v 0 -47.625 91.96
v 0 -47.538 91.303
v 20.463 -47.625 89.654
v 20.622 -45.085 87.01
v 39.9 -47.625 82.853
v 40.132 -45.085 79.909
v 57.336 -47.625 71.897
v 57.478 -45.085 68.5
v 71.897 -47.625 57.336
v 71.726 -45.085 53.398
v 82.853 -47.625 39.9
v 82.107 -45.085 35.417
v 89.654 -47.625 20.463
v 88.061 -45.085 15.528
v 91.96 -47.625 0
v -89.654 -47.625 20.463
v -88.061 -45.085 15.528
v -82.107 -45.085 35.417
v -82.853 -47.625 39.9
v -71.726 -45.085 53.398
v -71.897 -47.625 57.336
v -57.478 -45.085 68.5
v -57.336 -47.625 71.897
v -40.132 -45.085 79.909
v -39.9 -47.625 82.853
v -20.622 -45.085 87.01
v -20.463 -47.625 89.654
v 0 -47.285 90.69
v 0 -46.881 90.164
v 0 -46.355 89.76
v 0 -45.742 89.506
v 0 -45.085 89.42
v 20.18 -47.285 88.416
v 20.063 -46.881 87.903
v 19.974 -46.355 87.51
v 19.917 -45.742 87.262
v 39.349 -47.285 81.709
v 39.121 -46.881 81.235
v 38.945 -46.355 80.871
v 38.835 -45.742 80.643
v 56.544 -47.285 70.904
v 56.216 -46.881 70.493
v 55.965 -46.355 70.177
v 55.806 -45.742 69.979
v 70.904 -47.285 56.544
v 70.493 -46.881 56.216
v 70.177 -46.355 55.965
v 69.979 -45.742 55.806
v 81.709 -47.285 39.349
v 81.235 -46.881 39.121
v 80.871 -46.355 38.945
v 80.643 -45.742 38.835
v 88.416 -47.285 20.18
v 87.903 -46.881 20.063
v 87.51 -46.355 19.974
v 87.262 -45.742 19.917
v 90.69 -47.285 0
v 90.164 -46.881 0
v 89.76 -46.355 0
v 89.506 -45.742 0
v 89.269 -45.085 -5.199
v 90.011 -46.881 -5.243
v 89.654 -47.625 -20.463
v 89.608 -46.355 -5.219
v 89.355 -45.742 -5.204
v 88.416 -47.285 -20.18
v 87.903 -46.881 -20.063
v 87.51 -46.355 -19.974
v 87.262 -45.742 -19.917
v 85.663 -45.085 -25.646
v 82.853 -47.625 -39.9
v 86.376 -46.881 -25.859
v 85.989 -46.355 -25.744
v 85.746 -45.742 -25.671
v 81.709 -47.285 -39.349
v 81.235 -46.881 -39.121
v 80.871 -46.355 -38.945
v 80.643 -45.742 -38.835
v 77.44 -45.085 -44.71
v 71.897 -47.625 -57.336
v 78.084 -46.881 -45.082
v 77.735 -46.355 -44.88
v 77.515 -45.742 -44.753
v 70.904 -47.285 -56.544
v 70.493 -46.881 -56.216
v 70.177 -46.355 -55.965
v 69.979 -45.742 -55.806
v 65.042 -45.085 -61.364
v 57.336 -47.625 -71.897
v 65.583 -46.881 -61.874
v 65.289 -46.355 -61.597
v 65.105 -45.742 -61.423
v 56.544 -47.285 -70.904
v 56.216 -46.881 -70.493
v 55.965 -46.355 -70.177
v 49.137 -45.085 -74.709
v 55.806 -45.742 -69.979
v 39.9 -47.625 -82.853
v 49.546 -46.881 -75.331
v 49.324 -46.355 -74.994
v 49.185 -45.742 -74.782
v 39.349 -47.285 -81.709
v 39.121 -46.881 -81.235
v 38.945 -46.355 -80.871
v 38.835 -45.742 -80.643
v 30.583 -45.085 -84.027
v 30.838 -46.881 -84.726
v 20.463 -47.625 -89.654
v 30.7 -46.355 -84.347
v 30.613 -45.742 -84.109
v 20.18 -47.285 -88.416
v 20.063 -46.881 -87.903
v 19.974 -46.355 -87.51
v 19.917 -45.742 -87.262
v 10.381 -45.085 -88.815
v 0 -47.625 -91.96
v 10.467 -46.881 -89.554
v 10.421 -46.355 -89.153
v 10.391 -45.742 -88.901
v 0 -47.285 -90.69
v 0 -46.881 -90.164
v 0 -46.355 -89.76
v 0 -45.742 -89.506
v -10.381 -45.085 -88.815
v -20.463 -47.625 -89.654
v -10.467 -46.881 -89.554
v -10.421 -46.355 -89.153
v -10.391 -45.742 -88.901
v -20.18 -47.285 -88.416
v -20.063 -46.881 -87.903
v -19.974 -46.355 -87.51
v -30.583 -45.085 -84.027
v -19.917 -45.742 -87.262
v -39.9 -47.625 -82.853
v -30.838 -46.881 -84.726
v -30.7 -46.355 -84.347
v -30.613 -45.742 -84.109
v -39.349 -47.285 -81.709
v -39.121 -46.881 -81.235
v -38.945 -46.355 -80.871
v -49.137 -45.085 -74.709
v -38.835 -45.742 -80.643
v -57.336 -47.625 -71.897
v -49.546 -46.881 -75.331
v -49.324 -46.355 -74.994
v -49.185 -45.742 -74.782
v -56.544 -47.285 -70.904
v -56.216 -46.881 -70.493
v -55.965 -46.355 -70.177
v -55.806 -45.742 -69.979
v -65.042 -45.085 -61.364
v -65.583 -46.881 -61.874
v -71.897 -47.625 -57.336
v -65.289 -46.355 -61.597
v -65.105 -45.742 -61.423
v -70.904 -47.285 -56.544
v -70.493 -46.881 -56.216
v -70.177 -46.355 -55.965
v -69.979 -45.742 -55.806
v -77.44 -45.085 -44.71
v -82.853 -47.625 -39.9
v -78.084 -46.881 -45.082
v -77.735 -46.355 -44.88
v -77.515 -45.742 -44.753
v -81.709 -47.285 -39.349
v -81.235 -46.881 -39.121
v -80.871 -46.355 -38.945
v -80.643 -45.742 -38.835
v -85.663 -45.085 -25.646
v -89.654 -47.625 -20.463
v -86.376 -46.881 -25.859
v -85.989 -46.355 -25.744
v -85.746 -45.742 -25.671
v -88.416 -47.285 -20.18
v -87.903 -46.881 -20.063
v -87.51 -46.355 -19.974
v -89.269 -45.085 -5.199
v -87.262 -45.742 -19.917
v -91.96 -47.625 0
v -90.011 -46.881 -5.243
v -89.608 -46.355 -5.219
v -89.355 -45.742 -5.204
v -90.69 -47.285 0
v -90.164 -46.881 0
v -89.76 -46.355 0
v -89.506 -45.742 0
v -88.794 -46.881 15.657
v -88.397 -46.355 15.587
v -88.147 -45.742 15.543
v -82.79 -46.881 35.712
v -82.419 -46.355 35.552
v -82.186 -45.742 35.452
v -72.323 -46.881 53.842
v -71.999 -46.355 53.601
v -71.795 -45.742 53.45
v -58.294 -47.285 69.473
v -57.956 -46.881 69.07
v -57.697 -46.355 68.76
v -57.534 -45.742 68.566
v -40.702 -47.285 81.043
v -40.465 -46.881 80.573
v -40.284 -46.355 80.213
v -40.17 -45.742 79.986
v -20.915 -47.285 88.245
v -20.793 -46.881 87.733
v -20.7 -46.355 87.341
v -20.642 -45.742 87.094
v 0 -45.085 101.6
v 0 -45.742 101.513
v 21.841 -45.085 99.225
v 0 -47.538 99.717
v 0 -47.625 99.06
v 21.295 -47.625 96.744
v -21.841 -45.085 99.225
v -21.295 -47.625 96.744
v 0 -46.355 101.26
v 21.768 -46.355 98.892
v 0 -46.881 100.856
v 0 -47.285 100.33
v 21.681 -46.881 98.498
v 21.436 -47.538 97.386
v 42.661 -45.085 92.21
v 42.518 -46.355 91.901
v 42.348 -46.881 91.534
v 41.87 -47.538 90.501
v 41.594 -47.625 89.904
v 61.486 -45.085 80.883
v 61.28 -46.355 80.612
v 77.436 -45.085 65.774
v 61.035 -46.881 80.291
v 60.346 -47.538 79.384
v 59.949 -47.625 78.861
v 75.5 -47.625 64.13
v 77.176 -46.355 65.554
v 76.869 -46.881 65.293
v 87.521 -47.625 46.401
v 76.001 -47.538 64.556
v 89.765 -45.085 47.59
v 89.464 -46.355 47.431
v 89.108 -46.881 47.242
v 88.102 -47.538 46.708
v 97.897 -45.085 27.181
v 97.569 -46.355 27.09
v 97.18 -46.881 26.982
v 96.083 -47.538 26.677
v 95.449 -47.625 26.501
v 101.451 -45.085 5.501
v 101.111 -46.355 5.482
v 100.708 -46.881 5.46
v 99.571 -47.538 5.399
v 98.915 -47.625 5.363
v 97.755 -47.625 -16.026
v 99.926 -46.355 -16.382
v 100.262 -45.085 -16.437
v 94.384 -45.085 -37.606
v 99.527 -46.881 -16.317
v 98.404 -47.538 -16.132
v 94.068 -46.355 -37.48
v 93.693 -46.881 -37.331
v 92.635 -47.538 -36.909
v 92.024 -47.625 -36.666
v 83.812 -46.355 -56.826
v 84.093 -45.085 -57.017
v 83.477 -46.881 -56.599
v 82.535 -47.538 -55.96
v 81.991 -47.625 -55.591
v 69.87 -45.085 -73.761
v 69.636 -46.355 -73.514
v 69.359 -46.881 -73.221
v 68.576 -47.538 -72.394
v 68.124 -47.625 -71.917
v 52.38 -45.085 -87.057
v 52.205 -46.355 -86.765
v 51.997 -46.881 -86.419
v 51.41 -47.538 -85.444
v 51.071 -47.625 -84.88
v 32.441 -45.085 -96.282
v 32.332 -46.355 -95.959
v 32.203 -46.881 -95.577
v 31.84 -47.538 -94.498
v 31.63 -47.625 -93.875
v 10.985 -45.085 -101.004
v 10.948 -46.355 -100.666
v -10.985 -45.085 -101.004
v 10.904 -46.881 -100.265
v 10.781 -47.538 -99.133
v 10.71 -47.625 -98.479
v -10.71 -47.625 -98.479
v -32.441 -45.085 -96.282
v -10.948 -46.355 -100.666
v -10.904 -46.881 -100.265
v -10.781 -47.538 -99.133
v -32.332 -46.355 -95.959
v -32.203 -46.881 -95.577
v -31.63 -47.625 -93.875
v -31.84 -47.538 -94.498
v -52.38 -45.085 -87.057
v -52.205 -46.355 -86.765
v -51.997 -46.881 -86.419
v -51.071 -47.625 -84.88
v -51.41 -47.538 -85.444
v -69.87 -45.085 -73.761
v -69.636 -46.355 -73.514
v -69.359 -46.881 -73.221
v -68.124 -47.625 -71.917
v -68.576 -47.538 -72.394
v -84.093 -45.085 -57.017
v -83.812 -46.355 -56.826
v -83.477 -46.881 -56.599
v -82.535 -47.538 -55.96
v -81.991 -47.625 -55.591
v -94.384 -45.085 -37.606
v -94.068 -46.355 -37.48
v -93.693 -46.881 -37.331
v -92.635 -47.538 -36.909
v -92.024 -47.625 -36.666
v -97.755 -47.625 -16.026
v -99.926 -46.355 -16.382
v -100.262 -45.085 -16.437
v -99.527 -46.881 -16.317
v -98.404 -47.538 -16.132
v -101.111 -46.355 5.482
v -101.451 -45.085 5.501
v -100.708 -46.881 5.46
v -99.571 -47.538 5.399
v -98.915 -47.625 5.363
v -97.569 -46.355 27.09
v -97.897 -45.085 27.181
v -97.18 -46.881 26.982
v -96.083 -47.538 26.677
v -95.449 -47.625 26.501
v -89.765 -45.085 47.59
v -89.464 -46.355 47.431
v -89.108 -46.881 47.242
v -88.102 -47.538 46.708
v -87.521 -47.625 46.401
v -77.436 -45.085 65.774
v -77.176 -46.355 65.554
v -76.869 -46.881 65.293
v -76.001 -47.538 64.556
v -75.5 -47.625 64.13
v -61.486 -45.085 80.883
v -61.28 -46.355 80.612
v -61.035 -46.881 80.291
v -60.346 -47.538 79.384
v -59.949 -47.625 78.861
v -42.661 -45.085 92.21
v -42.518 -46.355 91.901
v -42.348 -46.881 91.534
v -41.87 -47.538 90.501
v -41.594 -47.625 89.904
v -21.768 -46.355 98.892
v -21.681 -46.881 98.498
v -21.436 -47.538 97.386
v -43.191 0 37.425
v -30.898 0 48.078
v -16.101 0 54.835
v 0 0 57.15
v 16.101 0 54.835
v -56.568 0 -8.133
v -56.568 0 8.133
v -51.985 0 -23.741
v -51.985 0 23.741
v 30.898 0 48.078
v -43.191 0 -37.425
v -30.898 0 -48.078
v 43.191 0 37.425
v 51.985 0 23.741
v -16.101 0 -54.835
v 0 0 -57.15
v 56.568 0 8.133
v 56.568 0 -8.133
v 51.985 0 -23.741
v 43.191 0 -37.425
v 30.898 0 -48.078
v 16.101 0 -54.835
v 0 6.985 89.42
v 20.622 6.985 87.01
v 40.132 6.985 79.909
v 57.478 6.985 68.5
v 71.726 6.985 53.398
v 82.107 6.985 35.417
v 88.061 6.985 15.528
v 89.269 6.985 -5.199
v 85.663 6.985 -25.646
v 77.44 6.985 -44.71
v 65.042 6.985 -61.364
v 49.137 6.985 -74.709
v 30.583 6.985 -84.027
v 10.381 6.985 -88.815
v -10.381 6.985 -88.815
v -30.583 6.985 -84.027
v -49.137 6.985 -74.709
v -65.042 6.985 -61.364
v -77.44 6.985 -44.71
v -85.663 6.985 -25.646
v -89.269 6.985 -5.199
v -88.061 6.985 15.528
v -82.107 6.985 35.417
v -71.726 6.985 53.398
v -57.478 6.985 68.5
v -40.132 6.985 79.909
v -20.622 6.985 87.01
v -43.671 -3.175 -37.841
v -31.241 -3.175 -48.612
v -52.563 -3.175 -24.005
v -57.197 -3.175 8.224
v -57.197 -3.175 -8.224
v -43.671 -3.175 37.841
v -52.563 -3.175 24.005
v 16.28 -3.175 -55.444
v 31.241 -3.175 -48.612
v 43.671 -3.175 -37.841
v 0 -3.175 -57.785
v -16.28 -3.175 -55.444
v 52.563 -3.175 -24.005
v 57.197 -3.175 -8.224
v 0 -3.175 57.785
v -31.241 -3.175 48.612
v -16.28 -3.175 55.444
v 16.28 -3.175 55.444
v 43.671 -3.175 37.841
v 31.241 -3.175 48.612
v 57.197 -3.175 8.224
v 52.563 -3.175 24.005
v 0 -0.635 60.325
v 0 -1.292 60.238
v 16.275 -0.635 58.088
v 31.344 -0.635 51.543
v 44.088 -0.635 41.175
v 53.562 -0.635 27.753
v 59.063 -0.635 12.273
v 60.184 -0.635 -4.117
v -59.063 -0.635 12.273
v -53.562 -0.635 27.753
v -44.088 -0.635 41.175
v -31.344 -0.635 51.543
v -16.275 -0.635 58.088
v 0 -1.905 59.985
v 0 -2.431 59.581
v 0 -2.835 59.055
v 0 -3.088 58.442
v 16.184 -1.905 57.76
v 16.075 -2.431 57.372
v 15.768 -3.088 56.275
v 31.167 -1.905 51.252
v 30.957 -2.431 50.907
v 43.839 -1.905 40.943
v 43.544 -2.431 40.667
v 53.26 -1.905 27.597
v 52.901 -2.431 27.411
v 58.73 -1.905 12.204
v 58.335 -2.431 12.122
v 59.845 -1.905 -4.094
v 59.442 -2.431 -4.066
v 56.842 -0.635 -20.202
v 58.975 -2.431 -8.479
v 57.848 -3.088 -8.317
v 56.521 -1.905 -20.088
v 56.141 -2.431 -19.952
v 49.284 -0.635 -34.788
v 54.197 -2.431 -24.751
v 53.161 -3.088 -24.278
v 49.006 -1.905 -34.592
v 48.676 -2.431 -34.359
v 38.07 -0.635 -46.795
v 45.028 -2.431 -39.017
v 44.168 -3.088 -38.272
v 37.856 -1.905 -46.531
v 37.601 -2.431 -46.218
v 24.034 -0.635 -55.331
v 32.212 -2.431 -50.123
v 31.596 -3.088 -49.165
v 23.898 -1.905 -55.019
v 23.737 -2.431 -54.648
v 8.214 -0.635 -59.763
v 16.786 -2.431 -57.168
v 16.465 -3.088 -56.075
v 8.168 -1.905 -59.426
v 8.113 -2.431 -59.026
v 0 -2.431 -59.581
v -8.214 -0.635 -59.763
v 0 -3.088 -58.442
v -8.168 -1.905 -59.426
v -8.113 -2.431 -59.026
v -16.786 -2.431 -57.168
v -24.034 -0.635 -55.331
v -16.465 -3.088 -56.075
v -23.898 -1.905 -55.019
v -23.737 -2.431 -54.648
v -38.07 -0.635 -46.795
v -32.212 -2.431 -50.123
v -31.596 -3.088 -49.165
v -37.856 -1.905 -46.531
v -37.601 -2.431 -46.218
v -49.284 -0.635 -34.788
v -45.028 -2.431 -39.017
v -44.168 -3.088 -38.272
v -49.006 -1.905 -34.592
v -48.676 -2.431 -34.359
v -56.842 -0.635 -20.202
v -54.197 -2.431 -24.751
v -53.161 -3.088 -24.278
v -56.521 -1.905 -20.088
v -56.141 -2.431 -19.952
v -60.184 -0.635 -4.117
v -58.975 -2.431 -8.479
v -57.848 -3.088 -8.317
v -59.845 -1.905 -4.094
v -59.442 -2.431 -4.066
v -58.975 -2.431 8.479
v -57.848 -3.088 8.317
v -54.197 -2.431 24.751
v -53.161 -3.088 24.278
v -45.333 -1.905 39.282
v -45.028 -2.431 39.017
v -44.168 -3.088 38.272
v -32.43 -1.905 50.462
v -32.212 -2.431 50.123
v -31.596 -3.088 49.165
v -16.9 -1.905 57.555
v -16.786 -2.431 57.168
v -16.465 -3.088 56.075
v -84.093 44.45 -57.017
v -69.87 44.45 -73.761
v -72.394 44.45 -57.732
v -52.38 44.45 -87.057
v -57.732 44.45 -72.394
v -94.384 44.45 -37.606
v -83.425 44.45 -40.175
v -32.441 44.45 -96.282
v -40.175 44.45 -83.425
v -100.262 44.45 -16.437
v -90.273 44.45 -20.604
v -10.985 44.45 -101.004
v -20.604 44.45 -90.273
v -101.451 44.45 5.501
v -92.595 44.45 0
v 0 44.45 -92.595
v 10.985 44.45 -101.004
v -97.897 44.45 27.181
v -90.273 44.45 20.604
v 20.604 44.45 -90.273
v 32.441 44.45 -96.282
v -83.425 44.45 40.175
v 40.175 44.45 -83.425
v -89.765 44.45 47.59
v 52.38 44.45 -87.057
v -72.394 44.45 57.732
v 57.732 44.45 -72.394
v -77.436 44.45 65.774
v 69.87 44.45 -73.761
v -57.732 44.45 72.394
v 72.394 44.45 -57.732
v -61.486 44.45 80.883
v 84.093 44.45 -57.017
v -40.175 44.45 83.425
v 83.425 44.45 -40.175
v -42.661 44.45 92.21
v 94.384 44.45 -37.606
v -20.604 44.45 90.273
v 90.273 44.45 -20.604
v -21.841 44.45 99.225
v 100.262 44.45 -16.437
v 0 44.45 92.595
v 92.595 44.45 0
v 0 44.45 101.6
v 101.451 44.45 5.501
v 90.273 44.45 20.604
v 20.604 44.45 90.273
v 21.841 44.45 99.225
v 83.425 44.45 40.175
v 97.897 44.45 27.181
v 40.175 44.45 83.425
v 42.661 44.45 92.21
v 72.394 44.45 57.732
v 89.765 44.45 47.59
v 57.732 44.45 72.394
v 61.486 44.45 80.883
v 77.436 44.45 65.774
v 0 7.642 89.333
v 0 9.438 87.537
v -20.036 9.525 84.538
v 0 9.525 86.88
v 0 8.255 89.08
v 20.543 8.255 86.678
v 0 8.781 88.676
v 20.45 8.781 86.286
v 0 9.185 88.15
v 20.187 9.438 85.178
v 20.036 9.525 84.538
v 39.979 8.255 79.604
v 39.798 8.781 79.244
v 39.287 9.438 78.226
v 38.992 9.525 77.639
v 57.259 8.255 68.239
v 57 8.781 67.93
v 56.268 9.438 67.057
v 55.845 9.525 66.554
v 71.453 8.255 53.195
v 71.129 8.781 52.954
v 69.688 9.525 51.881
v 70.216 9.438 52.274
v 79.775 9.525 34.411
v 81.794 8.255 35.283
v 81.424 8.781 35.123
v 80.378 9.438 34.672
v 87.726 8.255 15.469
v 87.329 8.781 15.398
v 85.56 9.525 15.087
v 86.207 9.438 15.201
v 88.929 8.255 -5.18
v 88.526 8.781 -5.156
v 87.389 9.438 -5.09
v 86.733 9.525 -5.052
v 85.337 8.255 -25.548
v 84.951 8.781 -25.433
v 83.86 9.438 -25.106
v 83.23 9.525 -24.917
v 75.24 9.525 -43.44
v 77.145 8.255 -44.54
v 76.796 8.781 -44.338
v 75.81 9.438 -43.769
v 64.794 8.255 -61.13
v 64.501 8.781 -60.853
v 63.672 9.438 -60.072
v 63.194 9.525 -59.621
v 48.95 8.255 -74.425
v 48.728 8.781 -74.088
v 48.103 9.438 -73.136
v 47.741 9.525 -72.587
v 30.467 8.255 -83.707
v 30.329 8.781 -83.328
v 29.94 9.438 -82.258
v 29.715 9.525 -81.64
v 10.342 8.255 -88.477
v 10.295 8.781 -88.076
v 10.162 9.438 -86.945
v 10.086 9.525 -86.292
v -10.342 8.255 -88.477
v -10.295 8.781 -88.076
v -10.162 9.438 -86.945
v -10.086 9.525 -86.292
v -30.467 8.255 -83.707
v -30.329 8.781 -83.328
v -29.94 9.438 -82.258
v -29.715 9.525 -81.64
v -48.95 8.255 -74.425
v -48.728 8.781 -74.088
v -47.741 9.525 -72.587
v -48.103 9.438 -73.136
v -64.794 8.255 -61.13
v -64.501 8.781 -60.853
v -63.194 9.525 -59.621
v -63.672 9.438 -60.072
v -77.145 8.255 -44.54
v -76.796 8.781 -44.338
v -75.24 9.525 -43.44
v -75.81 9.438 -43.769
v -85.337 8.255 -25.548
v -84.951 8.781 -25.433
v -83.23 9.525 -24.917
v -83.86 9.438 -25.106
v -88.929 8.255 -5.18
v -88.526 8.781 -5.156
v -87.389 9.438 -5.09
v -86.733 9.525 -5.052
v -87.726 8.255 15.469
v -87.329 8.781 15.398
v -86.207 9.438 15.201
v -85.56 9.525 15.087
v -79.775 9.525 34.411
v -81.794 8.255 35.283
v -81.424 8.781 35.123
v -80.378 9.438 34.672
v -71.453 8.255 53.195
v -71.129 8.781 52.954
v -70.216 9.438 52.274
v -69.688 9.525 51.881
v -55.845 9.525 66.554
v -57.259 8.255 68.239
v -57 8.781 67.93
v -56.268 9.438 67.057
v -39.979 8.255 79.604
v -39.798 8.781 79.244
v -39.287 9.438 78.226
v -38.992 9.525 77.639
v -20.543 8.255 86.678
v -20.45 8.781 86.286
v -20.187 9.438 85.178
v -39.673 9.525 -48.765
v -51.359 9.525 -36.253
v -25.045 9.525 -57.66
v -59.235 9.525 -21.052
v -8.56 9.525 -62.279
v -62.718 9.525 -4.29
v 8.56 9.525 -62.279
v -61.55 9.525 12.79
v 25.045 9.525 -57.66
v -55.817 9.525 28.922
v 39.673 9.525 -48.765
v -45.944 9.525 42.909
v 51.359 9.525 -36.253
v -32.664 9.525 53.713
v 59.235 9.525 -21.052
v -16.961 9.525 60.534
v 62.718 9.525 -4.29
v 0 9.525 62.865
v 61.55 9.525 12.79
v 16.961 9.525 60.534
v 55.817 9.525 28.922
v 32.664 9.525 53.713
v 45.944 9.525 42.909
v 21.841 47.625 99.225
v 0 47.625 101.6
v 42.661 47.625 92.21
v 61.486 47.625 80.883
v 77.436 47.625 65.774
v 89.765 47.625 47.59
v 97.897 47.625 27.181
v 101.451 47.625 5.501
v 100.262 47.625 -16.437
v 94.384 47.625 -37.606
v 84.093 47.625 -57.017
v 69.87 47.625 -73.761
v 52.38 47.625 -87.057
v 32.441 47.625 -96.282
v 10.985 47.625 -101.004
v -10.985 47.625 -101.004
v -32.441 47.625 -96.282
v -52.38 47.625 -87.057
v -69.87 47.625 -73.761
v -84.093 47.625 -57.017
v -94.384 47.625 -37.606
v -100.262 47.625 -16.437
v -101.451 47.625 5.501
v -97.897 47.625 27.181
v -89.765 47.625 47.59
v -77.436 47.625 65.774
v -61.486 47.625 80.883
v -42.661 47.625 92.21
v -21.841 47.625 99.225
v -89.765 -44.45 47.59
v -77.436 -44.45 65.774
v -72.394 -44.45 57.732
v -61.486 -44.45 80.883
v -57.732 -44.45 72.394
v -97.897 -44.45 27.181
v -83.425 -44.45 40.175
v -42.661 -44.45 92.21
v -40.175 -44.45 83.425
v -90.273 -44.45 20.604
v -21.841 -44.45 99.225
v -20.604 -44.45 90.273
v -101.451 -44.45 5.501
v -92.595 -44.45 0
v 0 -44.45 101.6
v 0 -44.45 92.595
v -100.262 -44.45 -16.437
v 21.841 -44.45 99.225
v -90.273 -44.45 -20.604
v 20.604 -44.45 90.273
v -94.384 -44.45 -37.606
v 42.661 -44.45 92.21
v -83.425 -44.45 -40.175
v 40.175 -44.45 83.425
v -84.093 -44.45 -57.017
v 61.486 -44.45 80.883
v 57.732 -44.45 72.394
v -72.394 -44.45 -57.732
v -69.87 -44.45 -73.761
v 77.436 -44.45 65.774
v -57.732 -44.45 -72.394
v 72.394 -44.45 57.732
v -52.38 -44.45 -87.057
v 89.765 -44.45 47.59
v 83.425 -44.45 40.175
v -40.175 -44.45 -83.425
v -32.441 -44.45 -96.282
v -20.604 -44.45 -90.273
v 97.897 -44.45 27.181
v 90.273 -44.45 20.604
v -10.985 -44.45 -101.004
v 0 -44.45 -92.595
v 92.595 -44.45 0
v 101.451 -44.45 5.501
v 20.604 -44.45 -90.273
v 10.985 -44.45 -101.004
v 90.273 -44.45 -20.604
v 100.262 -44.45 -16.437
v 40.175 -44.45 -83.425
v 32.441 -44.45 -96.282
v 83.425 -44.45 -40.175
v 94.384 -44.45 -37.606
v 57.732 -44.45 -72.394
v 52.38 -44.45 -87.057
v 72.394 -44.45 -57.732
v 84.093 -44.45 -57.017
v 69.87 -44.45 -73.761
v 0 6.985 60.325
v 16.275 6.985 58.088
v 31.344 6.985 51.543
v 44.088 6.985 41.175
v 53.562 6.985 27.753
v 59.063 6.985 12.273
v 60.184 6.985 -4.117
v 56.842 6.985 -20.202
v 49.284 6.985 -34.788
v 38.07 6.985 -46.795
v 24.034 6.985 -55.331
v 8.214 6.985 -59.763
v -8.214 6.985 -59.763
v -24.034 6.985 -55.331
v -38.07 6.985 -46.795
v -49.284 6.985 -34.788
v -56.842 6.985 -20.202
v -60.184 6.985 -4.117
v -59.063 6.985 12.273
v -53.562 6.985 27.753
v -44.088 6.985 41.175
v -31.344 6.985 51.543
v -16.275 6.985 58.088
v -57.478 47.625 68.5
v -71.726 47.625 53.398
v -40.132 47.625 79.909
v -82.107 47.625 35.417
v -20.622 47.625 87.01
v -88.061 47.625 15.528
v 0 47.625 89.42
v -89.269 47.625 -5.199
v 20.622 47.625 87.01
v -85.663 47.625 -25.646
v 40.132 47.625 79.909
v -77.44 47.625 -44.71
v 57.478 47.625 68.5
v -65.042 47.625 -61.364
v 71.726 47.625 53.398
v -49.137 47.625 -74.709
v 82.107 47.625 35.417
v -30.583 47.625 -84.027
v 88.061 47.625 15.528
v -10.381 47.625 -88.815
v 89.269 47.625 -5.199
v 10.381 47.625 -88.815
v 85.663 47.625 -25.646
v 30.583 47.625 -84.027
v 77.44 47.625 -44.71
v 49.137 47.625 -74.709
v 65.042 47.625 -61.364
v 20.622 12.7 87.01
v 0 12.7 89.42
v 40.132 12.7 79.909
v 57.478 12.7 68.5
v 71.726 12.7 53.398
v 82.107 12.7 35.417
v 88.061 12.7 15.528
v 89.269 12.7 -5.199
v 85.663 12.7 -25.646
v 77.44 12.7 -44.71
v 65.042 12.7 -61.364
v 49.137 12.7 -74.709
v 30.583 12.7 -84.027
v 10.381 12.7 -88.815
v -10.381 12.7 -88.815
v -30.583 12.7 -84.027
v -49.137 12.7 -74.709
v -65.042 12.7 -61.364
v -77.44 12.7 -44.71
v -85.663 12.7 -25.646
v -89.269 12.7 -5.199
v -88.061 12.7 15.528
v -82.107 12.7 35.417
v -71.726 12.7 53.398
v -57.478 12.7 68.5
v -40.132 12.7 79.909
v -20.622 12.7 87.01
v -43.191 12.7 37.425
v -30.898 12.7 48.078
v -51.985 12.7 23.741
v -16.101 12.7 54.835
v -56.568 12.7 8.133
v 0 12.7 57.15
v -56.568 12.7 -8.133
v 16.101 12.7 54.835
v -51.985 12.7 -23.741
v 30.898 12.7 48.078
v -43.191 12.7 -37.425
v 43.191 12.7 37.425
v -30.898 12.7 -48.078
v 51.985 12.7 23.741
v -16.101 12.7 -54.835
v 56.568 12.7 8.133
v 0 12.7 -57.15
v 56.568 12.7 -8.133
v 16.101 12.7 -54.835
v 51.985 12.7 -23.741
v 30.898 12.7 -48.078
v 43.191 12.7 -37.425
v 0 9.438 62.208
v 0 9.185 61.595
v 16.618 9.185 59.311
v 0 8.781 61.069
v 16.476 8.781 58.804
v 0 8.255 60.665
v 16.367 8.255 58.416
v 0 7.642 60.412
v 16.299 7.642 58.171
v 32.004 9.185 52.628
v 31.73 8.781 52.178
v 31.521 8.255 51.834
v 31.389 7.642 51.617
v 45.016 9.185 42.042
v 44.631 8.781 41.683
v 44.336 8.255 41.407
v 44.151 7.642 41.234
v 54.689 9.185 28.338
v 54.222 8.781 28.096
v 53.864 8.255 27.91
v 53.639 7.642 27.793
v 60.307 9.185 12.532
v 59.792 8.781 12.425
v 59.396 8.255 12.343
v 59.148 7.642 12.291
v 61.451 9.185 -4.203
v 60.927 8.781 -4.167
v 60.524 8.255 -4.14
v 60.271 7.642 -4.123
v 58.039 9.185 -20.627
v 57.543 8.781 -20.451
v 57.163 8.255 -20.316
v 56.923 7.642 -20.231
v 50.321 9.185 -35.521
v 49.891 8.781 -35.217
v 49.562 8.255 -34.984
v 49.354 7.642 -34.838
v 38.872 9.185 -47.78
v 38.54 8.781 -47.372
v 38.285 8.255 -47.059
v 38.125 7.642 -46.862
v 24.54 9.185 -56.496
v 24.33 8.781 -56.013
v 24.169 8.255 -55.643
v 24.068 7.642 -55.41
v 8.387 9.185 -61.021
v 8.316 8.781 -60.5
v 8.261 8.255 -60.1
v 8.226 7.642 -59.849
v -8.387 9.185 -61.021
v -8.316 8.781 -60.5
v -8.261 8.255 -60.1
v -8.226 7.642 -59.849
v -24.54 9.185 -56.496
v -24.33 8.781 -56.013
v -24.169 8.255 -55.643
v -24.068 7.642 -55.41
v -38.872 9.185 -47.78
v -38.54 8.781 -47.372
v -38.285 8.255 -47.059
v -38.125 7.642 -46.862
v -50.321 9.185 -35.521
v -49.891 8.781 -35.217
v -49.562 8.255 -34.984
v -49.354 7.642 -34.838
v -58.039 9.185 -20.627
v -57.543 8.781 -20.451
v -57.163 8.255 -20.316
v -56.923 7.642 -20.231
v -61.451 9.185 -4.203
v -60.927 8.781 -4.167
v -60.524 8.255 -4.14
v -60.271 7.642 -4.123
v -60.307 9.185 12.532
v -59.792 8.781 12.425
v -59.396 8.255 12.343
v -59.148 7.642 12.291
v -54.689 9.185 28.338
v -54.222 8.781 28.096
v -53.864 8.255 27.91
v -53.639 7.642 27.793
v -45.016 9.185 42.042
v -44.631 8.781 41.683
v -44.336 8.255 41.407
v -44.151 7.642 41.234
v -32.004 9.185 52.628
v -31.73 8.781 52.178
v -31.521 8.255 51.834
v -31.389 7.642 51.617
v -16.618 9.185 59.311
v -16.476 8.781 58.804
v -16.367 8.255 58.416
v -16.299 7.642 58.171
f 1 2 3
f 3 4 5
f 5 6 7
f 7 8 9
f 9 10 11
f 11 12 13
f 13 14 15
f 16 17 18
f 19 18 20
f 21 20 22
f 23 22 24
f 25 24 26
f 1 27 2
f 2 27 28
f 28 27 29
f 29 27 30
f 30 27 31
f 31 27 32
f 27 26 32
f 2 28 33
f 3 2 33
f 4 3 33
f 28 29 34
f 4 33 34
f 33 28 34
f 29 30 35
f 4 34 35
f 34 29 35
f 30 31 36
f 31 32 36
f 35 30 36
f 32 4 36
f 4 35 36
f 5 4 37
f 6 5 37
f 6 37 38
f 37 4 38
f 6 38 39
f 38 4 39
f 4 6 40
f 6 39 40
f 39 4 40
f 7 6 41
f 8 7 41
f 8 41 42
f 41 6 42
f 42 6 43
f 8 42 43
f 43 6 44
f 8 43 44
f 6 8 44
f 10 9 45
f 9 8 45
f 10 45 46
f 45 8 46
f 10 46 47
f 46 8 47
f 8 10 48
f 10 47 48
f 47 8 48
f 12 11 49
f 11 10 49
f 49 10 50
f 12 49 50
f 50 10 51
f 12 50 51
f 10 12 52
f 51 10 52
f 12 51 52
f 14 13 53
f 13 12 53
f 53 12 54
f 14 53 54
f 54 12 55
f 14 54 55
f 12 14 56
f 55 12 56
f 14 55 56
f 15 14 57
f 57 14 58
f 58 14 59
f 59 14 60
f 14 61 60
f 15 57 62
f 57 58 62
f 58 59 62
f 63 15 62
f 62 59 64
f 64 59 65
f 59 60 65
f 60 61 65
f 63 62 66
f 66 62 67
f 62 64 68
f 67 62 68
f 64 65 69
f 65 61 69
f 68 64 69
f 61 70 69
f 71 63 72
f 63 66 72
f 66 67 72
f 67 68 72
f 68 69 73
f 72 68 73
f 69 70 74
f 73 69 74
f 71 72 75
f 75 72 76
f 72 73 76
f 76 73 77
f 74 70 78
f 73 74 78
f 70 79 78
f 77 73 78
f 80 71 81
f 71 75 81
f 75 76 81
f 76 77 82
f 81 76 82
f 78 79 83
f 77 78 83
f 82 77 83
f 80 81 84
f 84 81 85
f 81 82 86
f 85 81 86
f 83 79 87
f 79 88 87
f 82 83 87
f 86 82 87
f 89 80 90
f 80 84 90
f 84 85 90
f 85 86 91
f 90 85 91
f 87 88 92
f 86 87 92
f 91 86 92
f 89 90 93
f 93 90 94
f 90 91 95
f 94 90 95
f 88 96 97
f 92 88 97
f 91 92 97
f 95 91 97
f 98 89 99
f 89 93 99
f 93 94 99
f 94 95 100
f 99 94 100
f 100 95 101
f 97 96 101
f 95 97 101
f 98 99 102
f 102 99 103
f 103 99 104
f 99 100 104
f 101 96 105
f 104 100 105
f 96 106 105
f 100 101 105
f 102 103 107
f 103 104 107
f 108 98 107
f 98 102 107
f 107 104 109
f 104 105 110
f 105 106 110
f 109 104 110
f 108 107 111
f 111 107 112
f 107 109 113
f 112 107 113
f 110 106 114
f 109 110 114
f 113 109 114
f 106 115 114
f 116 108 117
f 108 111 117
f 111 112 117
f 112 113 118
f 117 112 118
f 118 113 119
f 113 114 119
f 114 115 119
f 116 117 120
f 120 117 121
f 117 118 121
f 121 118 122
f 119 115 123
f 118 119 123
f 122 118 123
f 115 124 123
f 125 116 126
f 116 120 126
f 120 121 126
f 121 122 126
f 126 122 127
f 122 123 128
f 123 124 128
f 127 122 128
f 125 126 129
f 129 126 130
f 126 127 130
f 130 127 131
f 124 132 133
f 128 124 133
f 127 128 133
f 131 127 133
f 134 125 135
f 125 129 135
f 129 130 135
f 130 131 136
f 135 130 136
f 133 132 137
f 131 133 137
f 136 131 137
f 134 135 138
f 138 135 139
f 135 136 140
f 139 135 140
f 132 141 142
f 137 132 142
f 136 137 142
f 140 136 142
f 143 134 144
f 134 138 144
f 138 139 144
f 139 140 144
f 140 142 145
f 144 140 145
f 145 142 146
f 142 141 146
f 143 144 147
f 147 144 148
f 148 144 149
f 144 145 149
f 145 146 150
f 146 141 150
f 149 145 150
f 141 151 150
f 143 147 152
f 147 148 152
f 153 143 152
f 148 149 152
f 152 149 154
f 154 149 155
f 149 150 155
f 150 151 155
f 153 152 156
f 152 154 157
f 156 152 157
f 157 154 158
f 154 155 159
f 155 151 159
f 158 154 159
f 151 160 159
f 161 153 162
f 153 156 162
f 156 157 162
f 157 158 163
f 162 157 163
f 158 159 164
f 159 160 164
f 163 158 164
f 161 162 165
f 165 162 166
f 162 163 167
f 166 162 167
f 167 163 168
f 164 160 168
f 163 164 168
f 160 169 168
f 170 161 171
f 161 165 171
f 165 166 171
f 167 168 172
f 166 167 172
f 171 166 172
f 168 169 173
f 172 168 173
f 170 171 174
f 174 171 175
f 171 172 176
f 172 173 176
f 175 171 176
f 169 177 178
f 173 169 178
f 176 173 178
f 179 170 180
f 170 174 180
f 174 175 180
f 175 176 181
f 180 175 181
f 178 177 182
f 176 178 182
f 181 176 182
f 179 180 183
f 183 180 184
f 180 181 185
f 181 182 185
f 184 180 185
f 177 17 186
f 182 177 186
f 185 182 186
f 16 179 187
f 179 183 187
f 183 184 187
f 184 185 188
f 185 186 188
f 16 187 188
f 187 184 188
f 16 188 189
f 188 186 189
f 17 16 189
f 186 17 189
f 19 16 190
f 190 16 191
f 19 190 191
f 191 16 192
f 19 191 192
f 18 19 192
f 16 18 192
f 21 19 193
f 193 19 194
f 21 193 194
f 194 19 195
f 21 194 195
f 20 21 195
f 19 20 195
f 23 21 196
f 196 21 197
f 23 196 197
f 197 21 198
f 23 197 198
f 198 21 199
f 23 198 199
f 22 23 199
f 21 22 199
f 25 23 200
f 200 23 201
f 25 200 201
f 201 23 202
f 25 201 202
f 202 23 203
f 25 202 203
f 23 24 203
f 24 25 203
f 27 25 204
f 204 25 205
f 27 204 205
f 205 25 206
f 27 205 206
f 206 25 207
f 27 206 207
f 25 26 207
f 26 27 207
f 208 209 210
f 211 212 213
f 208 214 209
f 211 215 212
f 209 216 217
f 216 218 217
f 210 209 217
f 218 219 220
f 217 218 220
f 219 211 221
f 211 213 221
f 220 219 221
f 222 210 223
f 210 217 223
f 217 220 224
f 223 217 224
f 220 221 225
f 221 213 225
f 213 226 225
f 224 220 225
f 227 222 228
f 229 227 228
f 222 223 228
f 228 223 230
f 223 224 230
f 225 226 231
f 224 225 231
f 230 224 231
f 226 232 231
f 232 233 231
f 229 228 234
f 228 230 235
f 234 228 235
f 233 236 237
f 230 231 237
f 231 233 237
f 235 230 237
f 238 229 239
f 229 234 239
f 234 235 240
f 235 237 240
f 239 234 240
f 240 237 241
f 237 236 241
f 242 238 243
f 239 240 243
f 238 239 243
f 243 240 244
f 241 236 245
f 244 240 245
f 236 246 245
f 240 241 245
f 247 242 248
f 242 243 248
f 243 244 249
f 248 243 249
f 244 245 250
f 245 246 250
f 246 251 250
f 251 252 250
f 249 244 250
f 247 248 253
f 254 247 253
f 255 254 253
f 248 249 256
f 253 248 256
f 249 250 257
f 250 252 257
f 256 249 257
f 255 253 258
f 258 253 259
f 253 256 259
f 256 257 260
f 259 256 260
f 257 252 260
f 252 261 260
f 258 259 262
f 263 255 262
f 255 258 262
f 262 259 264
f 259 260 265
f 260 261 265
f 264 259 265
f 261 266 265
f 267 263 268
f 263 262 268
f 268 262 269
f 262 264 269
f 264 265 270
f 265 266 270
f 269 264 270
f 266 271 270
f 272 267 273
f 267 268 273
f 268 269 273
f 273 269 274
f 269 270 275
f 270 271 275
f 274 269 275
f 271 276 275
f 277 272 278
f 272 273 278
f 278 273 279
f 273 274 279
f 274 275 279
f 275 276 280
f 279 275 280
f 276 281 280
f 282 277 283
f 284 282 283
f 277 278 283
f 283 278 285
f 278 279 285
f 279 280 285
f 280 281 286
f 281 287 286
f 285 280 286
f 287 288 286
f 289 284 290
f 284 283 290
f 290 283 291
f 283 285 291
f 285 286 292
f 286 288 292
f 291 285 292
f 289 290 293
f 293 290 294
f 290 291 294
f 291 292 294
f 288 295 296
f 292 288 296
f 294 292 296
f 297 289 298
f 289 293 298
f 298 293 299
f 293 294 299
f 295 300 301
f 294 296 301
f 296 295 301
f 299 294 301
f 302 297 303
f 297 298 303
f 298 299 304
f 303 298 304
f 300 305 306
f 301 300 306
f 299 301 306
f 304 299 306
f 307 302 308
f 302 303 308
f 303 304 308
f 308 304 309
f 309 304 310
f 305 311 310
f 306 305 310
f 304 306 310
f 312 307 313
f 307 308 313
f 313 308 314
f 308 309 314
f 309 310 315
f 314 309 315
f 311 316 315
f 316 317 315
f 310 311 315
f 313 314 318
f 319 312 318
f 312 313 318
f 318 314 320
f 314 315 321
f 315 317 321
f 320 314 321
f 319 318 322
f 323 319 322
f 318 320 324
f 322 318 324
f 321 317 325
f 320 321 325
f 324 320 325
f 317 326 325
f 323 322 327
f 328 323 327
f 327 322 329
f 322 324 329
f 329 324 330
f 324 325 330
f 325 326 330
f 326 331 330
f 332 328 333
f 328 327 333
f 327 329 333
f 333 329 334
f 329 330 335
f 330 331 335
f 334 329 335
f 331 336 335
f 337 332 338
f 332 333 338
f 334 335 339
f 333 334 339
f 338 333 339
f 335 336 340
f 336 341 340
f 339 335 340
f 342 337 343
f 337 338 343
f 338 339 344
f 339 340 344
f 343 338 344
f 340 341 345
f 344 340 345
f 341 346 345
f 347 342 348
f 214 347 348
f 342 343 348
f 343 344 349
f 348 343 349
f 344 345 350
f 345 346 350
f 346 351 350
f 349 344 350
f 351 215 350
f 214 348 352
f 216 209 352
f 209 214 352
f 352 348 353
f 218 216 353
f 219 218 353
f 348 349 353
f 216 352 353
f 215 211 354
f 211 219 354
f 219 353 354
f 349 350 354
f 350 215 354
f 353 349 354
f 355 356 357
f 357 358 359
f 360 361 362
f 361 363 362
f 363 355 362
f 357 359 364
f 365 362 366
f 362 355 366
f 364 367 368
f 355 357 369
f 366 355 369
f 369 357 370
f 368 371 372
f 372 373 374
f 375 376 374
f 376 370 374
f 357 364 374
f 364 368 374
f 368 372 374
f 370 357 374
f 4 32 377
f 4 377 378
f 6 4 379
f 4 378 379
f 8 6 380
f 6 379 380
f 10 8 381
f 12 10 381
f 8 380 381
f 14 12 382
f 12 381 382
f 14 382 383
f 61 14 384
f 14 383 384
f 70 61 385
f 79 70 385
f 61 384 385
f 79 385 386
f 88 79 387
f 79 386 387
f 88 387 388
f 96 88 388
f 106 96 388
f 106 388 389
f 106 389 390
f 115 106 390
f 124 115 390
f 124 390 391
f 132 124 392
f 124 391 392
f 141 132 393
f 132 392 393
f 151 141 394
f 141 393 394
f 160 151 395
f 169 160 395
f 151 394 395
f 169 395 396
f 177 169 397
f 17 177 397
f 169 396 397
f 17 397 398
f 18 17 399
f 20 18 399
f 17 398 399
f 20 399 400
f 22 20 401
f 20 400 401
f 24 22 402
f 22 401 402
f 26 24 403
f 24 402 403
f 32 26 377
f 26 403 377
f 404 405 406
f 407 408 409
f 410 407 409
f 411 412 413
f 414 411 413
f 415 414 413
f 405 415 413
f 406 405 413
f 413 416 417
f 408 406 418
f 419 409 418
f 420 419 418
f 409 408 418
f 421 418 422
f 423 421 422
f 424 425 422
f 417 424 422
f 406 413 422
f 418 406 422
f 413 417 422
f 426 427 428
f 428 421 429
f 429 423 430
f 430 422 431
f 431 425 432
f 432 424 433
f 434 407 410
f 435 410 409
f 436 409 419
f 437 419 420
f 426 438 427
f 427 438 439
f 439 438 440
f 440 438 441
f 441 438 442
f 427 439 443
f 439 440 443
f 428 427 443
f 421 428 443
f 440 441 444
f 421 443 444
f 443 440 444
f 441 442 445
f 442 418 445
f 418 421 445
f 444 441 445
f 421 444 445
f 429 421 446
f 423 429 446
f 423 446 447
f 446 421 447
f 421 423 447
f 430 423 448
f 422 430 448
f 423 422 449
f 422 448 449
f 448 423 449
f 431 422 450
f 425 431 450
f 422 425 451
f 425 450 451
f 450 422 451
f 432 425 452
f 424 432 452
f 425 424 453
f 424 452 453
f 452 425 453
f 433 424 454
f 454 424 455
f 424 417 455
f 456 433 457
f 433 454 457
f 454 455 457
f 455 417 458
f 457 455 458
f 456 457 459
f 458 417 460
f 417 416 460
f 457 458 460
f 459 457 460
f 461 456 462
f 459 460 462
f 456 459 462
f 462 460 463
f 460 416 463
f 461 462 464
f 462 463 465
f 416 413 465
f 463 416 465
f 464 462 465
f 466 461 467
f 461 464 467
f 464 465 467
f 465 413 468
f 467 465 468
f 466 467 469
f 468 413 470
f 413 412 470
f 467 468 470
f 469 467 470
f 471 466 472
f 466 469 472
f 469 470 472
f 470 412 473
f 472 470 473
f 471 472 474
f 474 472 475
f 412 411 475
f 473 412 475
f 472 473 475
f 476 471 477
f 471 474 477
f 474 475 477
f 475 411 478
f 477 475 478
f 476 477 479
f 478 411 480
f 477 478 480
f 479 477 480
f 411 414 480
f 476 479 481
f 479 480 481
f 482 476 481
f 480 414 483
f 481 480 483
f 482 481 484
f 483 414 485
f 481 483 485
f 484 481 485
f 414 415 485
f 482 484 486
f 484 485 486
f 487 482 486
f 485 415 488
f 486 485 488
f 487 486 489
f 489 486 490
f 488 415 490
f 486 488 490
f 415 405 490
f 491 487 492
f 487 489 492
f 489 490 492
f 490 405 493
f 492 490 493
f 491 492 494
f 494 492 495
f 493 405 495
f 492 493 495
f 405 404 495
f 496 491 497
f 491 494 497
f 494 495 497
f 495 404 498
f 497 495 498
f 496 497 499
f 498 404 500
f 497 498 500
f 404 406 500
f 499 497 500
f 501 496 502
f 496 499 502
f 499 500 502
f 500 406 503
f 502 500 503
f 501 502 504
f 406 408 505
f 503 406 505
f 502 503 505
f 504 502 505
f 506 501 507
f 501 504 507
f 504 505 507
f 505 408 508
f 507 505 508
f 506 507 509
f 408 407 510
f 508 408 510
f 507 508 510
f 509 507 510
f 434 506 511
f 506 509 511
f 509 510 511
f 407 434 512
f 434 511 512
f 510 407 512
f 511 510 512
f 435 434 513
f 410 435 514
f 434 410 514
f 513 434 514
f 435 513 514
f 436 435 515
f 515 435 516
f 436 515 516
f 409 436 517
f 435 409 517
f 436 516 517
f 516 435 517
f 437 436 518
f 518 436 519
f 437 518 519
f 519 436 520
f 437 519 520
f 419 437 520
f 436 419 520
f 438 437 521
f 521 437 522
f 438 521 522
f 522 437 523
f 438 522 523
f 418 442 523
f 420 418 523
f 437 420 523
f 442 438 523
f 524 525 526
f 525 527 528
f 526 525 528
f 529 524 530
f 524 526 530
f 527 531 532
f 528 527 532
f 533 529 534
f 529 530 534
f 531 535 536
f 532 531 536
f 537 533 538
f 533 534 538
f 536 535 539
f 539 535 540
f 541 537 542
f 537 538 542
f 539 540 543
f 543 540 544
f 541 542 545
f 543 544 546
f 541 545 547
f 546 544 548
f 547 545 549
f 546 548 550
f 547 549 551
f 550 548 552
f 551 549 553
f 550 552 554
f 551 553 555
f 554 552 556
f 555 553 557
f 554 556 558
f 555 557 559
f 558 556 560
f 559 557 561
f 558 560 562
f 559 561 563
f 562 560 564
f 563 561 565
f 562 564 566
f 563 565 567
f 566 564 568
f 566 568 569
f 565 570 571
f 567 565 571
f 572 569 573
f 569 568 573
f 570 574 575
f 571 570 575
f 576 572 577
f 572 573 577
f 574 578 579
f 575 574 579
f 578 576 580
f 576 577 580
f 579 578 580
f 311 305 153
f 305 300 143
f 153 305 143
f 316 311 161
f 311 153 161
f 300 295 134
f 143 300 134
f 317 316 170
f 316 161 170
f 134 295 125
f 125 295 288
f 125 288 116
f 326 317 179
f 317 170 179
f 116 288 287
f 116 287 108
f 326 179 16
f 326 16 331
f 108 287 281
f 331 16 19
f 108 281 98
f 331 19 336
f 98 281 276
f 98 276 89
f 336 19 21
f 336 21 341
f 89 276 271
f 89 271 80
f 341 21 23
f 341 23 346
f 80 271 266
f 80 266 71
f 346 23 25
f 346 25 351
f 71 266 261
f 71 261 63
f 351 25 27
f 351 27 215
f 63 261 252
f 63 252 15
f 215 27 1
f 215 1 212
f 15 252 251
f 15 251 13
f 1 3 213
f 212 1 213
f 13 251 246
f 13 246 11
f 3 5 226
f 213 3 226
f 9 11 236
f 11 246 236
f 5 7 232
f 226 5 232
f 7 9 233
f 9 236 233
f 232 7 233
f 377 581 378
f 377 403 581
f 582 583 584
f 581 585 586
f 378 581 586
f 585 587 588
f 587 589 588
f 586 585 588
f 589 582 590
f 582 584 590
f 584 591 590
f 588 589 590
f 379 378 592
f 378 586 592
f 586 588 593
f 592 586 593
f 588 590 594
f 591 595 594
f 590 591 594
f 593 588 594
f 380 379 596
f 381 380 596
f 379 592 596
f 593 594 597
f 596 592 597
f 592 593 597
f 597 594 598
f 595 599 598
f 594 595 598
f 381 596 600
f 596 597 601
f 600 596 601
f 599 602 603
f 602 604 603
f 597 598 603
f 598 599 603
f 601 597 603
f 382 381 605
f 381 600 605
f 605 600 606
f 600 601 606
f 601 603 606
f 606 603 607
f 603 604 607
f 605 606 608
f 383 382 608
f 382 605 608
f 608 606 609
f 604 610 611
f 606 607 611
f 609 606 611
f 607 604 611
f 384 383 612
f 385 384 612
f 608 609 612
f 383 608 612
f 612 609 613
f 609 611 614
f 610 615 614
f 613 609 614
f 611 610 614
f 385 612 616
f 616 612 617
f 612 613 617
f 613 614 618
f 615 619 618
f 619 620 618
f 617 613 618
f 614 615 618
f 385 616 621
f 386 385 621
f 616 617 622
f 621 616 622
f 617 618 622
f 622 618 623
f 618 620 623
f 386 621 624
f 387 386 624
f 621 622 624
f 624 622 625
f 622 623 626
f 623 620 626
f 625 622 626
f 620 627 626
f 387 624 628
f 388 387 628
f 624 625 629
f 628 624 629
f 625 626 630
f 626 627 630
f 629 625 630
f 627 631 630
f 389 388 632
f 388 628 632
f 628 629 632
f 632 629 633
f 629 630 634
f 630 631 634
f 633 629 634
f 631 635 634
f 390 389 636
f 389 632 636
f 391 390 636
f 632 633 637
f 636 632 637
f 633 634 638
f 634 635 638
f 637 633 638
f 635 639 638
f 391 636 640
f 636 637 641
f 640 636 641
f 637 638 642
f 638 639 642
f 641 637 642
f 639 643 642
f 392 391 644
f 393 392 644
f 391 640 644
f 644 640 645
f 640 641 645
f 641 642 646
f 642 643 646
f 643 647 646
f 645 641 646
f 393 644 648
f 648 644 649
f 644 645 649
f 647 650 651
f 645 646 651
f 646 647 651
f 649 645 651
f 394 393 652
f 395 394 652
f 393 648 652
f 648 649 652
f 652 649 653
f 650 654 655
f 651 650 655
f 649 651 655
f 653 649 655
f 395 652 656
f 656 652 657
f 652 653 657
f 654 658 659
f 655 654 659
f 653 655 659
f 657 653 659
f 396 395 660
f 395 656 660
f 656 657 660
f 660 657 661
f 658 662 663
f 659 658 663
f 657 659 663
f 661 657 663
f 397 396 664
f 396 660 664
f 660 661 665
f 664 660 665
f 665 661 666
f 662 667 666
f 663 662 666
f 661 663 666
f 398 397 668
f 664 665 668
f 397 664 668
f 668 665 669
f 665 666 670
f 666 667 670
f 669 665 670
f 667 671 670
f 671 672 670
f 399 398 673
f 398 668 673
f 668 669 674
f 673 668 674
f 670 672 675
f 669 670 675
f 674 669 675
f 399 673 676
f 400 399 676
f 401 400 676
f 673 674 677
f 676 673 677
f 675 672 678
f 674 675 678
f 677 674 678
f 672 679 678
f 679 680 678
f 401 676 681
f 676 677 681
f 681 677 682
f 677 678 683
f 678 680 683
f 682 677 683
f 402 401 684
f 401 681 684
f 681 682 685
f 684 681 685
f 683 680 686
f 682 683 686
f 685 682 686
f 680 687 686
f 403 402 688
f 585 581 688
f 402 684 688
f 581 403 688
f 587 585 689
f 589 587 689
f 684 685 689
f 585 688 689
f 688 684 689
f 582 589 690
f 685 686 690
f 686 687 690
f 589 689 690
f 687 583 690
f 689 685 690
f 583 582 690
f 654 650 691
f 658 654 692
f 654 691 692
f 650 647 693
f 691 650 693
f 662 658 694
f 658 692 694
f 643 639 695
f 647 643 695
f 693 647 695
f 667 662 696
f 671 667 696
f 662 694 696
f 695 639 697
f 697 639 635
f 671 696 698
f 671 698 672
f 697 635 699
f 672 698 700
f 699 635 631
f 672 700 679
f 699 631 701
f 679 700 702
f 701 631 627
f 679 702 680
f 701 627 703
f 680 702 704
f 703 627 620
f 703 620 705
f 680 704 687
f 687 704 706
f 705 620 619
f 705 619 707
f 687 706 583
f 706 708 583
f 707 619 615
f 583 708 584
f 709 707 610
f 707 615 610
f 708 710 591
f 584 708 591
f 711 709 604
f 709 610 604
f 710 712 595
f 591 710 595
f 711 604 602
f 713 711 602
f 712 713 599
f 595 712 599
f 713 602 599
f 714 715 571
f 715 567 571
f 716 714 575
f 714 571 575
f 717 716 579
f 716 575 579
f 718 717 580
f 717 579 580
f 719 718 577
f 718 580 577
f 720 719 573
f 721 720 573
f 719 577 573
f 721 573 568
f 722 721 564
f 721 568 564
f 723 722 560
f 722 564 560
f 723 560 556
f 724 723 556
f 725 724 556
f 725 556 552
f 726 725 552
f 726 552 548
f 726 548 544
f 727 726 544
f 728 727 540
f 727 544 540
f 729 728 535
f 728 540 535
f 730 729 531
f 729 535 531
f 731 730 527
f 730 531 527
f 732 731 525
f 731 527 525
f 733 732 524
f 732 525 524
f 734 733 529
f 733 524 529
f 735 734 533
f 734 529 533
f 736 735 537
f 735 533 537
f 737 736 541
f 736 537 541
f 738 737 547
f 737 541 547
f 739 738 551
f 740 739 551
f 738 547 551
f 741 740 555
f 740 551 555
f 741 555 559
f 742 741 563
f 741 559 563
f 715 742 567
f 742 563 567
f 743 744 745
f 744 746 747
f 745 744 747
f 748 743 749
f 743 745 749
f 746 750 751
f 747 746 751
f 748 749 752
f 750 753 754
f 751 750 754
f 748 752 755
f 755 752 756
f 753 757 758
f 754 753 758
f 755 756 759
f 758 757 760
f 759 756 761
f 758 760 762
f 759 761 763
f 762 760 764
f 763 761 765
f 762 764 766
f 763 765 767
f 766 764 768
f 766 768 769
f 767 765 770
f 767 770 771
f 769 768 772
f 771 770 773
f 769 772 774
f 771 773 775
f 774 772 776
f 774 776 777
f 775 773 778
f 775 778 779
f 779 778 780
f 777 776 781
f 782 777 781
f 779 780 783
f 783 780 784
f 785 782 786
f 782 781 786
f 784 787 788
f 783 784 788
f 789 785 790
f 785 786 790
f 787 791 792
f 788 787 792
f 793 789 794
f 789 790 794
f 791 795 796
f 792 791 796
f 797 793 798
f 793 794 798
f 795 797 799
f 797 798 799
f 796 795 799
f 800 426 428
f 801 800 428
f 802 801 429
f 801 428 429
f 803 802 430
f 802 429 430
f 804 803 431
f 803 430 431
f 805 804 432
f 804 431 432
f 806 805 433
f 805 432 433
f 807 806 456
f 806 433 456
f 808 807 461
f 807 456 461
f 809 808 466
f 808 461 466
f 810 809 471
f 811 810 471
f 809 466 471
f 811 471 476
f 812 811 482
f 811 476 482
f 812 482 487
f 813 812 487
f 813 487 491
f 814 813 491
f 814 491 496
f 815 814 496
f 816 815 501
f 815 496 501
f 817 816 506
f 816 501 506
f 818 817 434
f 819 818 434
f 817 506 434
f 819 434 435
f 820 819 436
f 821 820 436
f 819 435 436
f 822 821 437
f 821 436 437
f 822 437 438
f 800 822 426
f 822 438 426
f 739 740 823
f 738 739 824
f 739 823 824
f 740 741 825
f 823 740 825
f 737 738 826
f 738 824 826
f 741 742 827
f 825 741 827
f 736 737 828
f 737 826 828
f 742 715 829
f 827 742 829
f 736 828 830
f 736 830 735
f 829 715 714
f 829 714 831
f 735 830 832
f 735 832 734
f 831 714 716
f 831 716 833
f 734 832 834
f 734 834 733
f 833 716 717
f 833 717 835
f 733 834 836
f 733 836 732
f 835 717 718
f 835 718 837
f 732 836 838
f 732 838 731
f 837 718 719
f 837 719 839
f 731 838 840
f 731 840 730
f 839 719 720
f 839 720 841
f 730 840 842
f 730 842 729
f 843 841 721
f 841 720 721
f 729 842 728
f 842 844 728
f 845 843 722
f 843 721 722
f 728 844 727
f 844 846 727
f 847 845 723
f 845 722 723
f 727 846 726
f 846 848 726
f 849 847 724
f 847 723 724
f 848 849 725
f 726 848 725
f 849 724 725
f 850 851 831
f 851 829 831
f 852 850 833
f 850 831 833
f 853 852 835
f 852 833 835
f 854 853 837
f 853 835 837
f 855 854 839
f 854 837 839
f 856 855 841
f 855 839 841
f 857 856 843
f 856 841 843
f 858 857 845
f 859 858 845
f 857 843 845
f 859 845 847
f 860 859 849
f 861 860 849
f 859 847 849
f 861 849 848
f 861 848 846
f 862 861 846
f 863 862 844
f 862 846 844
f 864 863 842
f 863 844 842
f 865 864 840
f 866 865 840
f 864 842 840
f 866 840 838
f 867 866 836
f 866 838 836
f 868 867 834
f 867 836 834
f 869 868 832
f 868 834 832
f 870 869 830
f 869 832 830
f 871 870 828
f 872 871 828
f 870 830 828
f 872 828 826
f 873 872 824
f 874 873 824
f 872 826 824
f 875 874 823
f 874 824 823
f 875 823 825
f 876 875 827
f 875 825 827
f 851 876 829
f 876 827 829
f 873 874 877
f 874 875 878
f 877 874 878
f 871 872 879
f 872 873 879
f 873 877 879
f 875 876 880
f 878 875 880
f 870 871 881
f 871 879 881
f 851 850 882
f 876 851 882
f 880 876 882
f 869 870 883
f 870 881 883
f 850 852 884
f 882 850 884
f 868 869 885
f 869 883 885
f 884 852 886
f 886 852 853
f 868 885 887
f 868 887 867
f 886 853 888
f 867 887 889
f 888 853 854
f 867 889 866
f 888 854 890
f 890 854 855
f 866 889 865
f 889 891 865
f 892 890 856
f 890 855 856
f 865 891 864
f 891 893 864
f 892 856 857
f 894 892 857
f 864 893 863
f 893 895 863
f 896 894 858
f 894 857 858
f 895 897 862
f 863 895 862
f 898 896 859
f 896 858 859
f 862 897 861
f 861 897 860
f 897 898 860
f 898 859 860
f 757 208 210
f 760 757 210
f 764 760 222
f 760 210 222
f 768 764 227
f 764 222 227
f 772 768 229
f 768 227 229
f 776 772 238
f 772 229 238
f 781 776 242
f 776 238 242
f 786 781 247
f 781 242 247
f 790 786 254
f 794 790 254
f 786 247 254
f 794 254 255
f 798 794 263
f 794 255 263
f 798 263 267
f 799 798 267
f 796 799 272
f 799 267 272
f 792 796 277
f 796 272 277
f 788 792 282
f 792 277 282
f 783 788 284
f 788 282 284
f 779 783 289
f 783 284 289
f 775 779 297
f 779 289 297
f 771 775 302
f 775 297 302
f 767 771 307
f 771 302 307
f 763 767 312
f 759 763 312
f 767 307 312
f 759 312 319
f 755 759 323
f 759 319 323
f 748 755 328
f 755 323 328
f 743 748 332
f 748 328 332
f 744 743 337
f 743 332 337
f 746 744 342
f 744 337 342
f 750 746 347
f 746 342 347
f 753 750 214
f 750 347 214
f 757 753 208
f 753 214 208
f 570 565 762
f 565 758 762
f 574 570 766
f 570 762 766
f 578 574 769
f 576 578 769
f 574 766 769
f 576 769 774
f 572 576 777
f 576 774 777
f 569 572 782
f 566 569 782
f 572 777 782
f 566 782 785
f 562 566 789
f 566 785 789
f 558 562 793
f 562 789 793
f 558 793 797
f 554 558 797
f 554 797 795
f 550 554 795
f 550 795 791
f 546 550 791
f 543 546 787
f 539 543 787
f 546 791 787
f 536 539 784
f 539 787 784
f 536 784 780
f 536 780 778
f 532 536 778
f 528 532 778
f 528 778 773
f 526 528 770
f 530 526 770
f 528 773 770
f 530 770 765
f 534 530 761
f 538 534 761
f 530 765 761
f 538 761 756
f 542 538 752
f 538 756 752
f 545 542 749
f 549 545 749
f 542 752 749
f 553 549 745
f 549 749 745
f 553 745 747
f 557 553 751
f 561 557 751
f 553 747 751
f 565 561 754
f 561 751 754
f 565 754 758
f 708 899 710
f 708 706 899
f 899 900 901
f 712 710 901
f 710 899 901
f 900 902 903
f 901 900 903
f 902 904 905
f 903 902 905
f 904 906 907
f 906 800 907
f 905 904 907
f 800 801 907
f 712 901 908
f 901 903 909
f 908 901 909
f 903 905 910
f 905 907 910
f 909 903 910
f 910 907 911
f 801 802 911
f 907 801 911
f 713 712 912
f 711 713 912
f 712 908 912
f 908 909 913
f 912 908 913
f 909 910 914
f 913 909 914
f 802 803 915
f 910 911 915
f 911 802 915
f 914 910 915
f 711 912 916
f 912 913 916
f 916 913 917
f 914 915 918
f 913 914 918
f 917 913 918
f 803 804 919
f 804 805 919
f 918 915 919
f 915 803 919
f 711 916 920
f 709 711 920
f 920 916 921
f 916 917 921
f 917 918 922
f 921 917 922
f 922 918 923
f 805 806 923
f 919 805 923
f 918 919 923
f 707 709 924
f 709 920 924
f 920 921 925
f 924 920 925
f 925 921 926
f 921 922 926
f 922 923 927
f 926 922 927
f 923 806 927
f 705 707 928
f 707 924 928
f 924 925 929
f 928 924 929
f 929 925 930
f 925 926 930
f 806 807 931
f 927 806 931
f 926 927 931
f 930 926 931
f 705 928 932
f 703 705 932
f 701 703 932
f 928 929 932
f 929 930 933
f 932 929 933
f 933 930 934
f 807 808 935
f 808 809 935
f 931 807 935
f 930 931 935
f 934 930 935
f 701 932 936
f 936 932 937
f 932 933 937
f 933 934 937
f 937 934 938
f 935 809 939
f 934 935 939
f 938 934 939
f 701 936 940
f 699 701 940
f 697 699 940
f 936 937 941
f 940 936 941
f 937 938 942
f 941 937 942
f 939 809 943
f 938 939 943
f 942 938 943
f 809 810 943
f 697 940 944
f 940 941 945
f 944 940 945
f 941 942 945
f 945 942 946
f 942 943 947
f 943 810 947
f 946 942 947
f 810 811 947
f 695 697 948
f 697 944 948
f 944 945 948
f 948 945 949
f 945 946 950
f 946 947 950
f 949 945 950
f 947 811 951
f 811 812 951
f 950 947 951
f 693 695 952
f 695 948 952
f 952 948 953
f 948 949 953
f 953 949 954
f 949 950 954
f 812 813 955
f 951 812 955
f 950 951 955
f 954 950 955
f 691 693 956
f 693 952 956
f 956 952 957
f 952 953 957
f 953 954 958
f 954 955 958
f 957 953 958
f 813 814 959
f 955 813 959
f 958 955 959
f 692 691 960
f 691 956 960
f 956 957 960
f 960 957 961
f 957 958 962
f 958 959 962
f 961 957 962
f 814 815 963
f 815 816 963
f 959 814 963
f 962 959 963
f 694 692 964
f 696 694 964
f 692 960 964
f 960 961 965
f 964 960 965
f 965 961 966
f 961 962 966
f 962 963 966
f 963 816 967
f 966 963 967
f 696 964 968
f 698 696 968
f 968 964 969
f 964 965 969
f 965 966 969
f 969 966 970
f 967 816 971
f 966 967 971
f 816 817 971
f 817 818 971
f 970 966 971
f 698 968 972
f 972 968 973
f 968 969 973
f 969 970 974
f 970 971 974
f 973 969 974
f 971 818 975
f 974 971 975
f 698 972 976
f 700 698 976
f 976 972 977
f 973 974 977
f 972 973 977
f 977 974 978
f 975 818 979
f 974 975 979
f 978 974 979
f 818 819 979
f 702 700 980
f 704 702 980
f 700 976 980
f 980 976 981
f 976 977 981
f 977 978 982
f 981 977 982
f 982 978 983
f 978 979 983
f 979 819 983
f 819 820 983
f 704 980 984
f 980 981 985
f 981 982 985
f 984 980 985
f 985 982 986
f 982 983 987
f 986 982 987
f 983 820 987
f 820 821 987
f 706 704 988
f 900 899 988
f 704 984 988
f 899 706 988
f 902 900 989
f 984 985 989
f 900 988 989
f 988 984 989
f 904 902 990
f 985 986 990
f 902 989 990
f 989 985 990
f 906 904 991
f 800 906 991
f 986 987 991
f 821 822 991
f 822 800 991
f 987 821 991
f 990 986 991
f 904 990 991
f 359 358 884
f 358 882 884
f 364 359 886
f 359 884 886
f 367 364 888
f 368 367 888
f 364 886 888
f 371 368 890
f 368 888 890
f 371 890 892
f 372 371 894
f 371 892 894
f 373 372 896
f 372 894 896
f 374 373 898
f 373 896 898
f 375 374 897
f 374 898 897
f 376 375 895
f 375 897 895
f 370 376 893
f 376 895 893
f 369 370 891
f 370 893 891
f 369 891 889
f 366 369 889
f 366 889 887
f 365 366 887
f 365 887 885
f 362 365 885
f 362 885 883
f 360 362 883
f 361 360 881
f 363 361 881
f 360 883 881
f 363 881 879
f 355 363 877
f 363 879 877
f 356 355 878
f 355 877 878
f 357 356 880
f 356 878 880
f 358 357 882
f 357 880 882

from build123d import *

# Parameters (mm, degrees)
F2_R = 2.54


with BuildPart() as f1:
    # F0 (on Right) → F1 (revolve)
    with BuildSketch(Plane.YZ):
        Polygon((-3.175, 0), (0, 0), (0, 57.15), (12.7, 57.15), (12.7, 89.419909), (47.625, 89.419909), (47.625, 101.6), (44.45, 101.6), (44.45, 92.594909), (-44.45, 92.594909), (-44.45, 101.6), (-47.625, 101.6), (-47.625, 89.419909), (9.525, 89.419909), (9.525, 60.325), (-3.175, 60.325), align=None)
    revolve(axis=Axis((0, -1.5875, 0), (0, 1, 0)))

    # F2
    f2_edges = [f1.edges().sort_by_distance(p)[0] for p in [
        (0, -47.625, -101.6),
        (0, -47.625, -89.419909),
        (0, 9.525, -89.419909),
        (0, 9.525, -60.325),
        (0, -3.175, -60.325),
    ]]
    fillet(f2_edges, radius=F2_R)


solid = f1.part
